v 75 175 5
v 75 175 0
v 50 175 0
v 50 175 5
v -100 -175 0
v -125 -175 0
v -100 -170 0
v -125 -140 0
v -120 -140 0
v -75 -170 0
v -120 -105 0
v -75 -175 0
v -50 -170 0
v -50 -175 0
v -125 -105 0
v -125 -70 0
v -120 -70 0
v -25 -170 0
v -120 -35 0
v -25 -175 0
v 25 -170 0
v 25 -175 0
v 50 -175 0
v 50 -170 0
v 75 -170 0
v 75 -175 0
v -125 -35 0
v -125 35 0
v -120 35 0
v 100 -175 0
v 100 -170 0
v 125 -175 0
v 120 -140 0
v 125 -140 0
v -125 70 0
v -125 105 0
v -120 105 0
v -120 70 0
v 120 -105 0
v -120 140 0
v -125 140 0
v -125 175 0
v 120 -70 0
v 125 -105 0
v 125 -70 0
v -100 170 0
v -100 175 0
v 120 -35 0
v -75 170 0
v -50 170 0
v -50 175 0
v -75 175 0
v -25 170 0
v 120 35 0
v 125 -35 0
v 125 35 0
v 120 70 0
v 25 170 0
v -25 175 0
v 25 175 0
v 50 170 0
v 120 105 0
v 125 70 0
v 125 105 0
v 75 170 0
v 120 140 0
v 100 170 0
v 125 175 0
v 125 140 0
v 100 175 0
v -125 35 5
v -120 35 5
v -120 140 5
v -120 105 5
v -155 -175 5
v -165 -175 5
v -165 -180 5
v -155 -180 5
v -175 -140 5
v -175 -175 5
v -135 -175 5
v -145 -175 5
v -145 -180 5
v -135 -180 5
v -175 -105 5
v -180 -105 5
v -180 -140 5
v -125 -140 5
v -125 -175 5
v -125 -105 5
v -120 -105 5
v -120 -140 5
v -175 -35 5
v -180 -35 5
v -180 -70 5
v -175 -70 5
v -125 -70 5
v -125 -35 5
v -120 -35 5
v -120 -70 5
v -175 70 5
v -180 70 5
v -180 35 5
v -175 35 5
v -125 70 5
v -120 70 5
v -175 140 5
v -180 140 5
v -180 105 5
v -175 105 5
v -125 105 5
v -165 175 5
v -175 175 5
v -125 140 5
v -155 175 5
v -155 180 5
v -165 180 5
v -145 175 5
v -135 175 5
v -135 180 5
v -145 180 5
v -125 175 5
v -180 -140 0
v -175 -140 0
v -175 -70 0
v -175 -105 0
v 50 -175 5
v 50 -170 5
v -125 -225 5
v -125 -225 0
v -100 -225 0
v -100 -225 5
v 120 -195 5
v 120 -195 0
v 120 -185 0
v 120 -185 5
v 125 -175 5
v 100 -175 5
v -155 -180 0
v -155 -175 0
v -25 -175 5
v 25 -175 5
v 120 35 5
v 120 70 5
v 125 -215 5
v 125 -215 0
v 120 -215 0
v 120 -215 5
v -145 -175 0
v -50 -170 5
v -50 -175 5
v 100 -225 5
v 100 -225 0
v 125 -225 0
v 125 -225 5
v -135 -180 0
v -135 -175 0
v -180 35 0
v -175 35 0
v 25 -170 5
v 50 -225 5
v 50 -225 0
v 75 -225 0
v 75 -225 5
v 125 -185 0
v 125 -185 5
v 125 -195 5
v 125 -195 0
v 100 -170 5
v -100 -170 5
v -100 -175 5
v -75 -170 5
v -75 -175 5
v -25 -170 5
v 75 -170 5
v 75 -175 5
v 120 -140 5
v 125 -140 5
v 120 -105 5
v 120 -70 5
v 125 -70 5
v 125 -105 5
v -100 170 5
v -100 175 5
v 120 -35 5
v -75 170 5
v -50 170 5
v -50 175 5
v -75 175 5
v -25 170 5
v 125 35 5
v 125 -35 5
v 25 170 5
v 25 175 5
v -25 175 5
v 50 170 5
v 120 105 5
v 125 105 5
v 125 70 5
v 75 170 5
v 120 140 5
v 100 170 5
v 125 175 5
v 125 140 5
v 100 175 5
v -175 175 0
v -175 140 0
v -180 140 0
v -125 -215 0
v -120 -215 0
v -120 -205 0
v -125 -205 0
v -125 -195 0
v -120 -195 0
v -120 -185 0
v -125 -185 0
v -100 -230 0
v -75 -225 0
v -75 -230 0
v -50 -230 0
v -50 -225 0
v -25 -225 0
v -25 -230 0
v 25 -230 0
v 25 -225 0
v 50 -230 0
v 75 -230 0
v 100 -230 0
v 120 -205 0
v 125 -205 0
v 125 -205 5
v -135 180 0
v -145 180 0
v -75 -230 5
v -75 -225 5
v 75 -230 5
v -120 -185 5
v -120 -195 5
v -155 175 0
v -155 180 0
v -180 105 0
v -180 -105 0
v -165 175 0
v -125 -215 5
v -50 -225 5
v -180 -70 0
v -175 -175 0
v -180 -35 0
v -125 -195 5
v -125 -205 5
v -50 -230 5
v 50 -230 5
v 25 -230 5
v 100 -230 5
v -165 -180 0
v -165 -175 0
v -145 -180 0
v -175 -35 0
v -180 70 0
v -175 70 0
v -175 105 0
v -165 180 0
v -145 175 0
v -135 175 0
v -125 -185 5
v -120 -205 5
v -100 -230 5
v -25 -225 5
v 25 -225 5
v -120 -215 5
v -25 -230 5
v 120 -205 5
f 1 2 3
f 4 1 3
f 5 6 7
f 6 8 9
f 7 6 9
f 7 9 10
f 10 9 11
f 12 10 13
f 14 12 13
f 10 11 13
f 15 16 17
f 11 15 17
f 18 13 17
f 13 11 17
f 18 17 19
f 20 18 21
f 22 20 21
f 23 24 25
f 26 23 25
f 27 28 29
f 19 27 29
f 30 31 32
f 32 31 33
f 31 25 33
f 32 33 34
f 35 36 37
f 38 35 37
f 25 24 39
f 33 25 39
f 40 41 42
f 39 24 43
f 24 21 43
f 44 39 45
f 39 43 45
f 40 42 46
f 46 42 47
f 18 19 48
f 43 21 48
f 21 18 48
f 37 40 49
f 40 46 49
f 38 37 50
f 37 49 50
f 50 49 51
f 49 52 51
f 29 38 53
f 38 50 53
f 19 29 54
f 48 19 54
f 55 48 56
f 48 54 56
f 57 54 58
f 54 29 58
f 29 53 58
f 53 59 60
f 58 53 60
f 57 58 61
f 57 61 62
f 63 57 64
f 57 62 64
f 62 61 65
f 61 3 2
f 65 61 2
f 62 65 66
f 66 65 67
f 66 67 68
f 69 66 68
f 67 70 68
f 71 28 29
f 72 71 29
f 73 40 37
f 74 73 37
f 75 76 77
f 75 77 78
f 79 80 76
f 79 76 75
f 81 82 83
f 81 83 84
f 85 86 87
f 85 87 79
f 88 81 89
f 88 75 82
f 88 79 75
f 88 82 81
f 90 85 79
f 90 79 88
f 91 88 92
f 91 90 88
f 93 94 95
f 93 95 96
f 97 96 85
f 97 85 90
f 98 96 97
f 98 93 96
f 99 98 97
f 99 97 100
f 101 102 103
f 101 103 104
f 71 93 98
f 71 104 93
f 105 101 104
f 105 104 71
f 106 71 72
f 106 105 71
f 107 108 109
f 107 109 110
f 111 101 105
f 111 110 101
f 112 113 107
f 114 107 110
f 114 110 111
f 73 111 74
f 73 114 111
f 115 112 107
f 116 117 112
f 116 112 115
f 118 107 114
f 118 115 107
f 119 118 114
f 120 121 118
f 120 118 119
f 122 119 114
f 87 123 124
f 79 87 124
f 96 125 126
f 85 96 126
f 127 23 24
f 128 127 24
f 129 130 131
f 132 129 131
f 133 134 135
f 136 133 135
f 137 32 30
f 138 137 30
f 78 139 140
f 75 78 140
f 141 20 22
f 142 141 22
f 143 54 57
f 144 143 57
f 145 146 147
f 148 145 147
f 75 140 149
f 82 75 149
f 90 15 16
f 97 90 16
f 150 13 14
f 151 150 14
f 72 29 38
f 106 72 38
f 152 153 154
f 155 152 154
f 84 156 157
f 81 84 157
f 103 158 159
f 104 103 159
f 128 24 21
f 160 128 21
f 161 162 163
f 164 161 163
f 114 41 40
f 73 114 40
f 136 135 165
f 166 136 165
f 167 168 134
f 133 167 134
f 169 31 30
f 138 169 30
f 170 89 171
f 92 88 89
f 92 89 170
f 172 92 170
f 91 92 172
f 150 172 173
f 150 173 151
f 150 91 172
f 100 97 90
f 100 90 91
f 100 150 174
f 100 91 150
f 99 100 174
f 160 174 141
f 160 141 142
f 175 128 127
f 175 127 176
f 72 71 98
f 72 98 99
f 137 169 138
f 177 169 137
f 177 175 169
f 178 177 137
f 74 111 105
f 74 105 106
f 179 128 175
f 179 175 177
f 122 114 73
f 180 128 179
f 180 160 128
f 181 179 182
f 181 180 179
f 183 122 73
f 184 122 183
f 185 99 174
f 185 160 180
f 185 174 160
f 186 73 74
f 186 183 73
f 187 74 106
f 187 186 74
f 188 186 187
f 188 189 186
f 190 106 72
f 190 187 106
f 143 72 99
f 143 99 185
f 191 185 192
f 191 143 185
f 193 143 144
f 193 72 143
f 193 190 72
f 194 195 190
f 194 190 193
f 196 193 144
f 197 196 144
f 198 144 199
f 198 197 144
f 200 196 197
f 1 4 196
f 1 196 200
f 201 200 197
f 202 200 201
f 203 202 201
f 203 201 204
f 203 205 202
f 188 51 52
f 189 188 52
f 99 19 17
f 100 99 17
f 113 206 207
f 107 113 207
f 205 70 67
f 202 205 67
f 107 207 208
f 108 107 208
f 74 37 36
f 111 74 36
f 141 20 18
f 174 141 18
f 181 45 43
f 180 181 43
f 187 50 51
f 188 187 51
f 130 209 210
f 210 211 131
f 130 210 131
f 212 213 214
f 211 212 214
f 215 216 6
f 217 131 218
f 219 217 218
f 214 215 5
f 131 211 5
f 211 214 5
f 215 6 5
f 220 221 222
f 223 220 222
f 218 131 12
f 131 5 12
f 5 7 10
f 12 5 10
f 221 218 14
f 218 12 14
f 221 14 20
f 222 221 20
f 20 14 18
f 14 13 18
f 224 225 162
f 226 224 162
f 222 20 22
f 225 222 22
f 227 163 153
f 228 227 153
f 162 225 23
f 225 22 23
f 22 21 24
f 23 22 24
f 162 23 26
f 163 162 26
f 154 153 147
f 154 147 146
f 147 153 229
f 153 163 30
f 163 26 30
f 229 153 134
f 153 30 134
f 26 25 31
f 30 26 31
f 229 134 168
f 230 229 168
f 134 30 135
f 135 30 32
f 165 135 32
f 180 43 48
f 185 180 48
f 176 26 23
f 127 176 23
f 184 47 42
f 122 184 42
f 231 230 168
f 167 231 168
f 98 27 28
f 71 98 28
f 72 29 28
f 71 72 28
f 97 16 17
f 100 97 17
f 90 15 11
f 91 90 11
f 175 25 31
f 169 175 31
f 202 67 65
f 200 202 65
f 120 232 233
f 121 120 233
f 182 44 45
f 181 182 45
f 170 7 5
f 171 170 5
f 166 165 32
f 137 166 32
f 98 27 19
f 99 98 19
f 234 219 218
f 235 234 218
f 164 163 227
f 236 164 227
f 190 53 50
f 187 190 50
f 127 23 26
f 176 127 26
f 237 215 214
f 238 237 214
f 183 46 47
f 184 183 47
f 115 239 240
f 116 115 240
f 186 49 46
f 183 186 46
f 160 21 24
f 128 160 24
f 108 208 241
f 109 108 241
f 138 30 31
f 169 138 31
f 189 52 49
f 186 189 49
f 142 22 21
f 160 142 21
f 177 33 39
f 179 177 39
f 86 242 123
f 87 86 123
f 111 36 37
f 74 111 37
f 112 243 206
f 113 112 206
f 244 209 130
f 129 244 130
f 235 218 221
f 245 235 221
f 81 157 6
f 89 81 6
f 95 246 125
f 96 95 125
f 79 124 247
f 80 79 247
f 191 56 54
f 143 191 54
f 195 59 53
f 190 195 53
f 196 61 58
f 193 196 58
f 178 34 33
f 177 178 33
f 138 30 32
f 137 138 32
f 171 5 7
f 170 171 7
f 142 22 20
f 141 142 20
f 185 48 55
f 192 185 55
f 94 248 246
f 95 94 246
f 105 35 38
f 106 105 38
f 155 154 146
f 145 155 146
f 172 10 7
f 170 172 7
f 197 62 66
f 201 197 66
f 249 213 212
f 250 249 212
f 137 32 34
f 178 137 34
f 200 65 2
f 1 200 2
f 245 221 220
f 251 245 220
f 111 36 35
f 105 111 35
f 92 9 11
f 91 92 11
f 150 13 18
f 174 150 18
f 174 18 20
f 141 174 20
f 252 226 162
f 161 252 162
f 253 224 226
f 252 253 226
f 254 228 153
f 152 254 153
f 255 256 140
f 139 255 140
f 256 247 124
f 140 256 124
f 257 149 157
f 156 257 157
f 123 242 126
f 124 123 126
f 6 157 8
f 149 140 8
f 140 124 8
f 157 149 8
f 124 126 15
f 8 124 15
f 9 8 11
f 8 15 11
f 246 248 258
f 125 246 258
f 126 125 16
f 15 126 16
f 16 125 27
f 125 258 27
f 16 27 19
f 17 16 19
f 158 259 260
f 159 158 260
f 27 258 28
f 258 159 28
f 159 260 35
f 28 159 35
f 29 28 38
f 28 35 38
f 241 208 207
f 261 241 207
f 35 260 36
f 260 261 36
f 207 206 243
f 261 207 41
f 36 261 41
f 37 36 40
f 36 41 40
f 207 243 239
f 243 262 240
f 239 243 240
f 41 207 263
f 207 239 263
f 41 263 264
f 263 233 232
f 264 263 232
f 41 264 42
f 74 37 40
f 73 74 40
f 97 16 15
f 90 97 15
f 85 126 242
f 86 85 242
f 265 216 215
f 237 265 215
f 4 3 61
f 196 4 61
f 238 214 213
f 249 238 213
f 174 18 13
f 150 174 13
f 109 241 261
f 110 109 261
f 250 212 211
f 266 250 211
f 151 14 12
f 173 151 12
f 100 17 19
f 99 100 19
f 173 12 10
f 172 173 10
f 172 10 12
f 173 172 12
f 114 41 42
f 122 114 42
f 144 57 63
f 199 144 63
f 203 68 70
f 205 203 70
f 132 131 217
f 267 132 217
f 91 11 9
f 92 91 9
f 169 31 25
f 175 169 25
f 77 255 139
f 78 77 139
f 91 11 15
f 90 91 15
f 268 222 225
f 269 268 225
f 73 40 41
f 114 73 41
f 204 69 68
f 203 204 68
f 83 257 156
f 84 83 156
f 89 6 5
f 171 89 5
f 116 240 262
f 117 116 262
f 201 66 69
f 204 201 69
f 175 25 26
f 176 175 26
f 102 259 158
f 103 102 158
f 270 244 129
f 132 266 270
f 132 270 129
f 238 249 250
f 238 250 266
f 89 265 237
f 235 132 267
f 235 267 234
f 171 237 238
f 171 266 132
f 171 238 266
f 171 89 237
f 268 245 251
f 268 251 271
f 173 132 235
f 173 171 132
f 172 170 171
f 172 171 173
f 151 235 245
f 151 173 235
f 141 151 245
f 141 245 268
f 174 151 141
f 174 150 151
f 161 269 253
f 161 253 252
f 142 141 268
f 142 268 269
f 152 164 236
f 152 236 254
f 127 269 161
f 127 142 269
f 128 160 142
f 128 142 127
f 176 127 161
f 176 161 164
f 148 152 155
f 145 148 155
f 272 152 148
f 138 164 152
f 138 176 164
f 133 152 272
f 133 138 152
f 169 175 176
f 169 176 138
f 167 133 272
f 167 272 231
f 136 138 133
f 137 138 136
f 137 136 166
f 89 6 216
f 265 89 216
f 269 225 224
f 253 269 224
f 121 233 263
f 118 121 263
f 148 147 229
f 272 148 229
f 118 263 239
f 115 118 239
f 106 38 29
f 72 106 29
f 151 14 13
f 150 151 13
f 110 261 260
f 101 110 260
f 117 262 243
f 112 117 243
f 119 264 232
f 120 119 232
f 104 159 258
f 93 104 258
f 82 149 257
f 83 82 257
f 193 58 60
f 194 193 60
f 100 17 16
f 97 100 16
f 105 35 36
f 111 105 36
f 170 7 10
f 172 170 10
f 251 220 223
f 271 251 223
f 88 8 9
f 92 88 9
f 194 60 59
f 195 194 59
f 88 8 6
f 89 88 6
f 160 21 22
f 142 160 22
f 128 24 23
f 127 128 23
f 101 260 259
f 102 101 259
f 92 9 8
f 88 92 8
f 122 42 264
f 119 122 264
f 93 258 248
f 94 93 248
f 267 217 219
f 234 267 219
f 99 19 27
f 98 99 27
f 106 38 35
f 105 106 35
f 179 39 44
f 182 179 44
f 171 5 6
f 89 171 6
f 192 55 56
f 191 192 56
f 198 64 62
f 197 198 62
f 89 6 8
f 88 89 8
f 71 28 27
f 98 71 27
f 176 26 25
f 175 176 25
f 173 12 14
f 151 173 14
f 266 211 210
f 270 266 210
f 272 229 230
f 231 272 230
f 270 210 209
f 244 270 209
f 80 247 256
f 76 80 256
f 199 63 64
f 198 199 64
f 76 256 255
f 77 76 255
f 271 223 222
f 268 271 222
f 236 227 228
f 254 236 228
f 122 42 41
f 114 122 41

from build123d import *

# Parameters (mm, degrees)
F2_DEPTH = 5
F3_DEPTH = 5
F4_DEPTH = 5


with BuildPart() as f2:
    # F1 (on Top) → F2 (new body)
    with BuildSketch(Plane.XY):
        Polygon((120, -175), (125, -175), (125, -170), (125, -140), (120, -140), (120, -105), (125, -105), (125, -70), (120, -70), (120, -35), (125, -35), (125, 35), (120, 35), (120, 70), (125, 70), (125, 105), (120, 105), (120, 140), (125, 140), (125, 170), (125, 175), (100, 175), (100, 170), (75, 170), (75, 175), (50, 175), (50, 170), (25, 170), (25, 175), (0, 175), (-25, 175), (-25, 170), (-50, 170), (-50, 175), (-75, 175), (-75, 170), (-100, 170), (-100, 175), (-125, 175), (-125, 140), (-120, 140), (-120, 105), (-125, 105), (-125, 70), (-120, 70), (-120, 35), (-125, 35), (-125, 0), (-125, -35), (-120, -35), (-120, -70), (-125, -70), (-125, -105), (-120, -105), (-120, -140), (-125, -140), (-125, -175), (-120, -175), (-100, -175), (-100, -170), (-75, -170), (-75, -175), (-50, -175), (-50, -170), (-25, -170), (-25, -175), (0, -175), (25, -175), (25, -170), (50, -170), (50, -175), (75, -175), (75, -170), (100, -170), (100, -175), align=None)
    extrude(amount=F2_DEPTH)


with BuildPart() as f3:
    # F1 (on Top) → F3 (new body)
    with BuildSketch(Plane.XY):
        Polygon((-135, -175), (-125, -175), (-125, -140), (-120, -140), (-120, -105), (-125, -105), (-125, -70), (-120, -70), (-120, -35), (-125, -35), (-125, 0), (-125, 35), (-120, 35), (-120, 70), (-125, 70), (-125, 105), (-120, 105), (-120, 140), (-125, 140), (-125, 175), (-135, 175), (-135, 180), (-145, 180), (-145, 175), (-155, 175), (-155, 180), (-165, 180), (-165, 175), (-175, 175), (-175, 140), (-180, 140), (-180, 105), (-175, 105), (-175, 70), (-180, 70), (-180, 35), (-175, 35), (-175, -35), (-180, -35), (-180, -70), (-175, -70), (-175, -105), (-180, -105), (-180, -140), (-175, -140), (-175, -175), (-165, -175), (-165, -180), (-155, -180), (-155, -175), (-145, -175), (-145, -180), (-135, -180), align=None)
    extrude(amount=F3_DEPTH)


with BuildPart() as f4:
    # F1 (on Top) → F4 (new body)
    with BuildSketch(Plane.XY):
        Polygon((125, -185), (125, -175), (120, -175), (100, -175), (100, -170), (75, -170), (75, -175), (50, -175), (50, -170), (25, -170), (25, -175), (0, -175), (-25, -175), (-25, -170), (-50, -170), (-50, -175), (-75, -175), (-75, -170), (-100, -170), (-100, -175), (-120, -175), (-125, -175), (-125, -185), (-120, -185), (-120, -195), (-125, -195), (-125, -205), (-120, -205), (-120, -215), (-125, -215), (-125, -225), (-100, -225), (-100, -230), (-75, -230), (-75, -225), (-50, -225), (-50, -230), (-25, -230), (-25, -225), (0, -225), (25, -225), (25, -230), (50, -230), (50, -225), (75, -225), (75, -230), (100, -230), (100, -225), (125, -225), (125, -215), (120, -215), (120, -205), (125, -205), (125, -195), (120, -195), (120, -185), align=None)
    extrude(amount=F4_DEPTH)


solid = Compound([f2.part, f3.part, f4.part])
